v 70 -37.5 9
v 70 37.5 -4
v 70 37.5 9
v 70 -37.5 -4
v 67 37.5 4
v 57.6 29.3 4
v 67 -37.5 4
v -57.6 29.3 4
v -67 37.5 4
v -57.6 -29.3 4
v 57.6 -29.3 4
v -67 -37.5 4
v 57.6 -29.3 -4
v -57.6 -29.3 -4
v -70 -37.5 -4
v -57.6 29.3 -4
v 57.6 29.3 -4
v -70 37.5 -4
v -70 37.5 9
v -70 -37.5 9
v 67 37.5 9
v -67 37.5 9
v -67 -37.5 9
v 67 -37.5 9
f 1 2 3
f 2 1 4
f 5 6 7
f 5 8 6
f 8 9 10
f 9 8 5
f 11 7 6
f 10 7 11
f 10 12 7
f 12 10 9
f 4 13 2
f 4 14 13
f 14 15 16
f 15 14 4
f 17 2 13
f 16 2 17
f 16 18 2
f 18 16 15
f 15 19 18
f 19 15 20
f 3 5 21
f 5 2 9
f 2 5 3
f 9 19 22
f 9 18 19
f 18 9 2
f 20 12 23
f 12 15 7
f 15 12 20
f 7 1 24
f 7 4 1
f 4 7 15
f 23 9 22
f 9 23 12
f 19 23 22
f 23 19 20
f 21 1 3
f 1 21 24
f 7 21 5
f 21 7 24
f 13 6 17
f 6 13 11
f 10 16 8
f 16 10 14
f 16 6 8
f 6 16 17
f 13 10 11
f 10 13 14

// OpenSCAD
//Size of phone, default iphone 4
height = 58.6;
width = 115.2;

depth = 1*20;//9.3;
//iPhone 4 : 115.2 mm (4.54 in) H; 58.6 mm (2.31 in) W; 9.3 mm (0.37 in) D
//iPhone 5 : 123.8 mm (4.87 in) H; 58.6 mm (2.31 in) W; 7.6 mm (0.30 in) D


module dodocase()
{
	difference() {
		//outer frame
		union()	{	translate([-140/2,-75/2,-8/2]) cube([140,75,8]);
			translate([-140/2,-75/2,8/2]) cube([3,75,5]); //side left
			translate([140/2-3,-75/2,8/2]) cube([3,75,5]); //site right
		}
		//phone
		{
			translate([-width/2,-height/2,-depth/2]) cube([width,height,depth]);	
		}
	}
}

dodocase();
